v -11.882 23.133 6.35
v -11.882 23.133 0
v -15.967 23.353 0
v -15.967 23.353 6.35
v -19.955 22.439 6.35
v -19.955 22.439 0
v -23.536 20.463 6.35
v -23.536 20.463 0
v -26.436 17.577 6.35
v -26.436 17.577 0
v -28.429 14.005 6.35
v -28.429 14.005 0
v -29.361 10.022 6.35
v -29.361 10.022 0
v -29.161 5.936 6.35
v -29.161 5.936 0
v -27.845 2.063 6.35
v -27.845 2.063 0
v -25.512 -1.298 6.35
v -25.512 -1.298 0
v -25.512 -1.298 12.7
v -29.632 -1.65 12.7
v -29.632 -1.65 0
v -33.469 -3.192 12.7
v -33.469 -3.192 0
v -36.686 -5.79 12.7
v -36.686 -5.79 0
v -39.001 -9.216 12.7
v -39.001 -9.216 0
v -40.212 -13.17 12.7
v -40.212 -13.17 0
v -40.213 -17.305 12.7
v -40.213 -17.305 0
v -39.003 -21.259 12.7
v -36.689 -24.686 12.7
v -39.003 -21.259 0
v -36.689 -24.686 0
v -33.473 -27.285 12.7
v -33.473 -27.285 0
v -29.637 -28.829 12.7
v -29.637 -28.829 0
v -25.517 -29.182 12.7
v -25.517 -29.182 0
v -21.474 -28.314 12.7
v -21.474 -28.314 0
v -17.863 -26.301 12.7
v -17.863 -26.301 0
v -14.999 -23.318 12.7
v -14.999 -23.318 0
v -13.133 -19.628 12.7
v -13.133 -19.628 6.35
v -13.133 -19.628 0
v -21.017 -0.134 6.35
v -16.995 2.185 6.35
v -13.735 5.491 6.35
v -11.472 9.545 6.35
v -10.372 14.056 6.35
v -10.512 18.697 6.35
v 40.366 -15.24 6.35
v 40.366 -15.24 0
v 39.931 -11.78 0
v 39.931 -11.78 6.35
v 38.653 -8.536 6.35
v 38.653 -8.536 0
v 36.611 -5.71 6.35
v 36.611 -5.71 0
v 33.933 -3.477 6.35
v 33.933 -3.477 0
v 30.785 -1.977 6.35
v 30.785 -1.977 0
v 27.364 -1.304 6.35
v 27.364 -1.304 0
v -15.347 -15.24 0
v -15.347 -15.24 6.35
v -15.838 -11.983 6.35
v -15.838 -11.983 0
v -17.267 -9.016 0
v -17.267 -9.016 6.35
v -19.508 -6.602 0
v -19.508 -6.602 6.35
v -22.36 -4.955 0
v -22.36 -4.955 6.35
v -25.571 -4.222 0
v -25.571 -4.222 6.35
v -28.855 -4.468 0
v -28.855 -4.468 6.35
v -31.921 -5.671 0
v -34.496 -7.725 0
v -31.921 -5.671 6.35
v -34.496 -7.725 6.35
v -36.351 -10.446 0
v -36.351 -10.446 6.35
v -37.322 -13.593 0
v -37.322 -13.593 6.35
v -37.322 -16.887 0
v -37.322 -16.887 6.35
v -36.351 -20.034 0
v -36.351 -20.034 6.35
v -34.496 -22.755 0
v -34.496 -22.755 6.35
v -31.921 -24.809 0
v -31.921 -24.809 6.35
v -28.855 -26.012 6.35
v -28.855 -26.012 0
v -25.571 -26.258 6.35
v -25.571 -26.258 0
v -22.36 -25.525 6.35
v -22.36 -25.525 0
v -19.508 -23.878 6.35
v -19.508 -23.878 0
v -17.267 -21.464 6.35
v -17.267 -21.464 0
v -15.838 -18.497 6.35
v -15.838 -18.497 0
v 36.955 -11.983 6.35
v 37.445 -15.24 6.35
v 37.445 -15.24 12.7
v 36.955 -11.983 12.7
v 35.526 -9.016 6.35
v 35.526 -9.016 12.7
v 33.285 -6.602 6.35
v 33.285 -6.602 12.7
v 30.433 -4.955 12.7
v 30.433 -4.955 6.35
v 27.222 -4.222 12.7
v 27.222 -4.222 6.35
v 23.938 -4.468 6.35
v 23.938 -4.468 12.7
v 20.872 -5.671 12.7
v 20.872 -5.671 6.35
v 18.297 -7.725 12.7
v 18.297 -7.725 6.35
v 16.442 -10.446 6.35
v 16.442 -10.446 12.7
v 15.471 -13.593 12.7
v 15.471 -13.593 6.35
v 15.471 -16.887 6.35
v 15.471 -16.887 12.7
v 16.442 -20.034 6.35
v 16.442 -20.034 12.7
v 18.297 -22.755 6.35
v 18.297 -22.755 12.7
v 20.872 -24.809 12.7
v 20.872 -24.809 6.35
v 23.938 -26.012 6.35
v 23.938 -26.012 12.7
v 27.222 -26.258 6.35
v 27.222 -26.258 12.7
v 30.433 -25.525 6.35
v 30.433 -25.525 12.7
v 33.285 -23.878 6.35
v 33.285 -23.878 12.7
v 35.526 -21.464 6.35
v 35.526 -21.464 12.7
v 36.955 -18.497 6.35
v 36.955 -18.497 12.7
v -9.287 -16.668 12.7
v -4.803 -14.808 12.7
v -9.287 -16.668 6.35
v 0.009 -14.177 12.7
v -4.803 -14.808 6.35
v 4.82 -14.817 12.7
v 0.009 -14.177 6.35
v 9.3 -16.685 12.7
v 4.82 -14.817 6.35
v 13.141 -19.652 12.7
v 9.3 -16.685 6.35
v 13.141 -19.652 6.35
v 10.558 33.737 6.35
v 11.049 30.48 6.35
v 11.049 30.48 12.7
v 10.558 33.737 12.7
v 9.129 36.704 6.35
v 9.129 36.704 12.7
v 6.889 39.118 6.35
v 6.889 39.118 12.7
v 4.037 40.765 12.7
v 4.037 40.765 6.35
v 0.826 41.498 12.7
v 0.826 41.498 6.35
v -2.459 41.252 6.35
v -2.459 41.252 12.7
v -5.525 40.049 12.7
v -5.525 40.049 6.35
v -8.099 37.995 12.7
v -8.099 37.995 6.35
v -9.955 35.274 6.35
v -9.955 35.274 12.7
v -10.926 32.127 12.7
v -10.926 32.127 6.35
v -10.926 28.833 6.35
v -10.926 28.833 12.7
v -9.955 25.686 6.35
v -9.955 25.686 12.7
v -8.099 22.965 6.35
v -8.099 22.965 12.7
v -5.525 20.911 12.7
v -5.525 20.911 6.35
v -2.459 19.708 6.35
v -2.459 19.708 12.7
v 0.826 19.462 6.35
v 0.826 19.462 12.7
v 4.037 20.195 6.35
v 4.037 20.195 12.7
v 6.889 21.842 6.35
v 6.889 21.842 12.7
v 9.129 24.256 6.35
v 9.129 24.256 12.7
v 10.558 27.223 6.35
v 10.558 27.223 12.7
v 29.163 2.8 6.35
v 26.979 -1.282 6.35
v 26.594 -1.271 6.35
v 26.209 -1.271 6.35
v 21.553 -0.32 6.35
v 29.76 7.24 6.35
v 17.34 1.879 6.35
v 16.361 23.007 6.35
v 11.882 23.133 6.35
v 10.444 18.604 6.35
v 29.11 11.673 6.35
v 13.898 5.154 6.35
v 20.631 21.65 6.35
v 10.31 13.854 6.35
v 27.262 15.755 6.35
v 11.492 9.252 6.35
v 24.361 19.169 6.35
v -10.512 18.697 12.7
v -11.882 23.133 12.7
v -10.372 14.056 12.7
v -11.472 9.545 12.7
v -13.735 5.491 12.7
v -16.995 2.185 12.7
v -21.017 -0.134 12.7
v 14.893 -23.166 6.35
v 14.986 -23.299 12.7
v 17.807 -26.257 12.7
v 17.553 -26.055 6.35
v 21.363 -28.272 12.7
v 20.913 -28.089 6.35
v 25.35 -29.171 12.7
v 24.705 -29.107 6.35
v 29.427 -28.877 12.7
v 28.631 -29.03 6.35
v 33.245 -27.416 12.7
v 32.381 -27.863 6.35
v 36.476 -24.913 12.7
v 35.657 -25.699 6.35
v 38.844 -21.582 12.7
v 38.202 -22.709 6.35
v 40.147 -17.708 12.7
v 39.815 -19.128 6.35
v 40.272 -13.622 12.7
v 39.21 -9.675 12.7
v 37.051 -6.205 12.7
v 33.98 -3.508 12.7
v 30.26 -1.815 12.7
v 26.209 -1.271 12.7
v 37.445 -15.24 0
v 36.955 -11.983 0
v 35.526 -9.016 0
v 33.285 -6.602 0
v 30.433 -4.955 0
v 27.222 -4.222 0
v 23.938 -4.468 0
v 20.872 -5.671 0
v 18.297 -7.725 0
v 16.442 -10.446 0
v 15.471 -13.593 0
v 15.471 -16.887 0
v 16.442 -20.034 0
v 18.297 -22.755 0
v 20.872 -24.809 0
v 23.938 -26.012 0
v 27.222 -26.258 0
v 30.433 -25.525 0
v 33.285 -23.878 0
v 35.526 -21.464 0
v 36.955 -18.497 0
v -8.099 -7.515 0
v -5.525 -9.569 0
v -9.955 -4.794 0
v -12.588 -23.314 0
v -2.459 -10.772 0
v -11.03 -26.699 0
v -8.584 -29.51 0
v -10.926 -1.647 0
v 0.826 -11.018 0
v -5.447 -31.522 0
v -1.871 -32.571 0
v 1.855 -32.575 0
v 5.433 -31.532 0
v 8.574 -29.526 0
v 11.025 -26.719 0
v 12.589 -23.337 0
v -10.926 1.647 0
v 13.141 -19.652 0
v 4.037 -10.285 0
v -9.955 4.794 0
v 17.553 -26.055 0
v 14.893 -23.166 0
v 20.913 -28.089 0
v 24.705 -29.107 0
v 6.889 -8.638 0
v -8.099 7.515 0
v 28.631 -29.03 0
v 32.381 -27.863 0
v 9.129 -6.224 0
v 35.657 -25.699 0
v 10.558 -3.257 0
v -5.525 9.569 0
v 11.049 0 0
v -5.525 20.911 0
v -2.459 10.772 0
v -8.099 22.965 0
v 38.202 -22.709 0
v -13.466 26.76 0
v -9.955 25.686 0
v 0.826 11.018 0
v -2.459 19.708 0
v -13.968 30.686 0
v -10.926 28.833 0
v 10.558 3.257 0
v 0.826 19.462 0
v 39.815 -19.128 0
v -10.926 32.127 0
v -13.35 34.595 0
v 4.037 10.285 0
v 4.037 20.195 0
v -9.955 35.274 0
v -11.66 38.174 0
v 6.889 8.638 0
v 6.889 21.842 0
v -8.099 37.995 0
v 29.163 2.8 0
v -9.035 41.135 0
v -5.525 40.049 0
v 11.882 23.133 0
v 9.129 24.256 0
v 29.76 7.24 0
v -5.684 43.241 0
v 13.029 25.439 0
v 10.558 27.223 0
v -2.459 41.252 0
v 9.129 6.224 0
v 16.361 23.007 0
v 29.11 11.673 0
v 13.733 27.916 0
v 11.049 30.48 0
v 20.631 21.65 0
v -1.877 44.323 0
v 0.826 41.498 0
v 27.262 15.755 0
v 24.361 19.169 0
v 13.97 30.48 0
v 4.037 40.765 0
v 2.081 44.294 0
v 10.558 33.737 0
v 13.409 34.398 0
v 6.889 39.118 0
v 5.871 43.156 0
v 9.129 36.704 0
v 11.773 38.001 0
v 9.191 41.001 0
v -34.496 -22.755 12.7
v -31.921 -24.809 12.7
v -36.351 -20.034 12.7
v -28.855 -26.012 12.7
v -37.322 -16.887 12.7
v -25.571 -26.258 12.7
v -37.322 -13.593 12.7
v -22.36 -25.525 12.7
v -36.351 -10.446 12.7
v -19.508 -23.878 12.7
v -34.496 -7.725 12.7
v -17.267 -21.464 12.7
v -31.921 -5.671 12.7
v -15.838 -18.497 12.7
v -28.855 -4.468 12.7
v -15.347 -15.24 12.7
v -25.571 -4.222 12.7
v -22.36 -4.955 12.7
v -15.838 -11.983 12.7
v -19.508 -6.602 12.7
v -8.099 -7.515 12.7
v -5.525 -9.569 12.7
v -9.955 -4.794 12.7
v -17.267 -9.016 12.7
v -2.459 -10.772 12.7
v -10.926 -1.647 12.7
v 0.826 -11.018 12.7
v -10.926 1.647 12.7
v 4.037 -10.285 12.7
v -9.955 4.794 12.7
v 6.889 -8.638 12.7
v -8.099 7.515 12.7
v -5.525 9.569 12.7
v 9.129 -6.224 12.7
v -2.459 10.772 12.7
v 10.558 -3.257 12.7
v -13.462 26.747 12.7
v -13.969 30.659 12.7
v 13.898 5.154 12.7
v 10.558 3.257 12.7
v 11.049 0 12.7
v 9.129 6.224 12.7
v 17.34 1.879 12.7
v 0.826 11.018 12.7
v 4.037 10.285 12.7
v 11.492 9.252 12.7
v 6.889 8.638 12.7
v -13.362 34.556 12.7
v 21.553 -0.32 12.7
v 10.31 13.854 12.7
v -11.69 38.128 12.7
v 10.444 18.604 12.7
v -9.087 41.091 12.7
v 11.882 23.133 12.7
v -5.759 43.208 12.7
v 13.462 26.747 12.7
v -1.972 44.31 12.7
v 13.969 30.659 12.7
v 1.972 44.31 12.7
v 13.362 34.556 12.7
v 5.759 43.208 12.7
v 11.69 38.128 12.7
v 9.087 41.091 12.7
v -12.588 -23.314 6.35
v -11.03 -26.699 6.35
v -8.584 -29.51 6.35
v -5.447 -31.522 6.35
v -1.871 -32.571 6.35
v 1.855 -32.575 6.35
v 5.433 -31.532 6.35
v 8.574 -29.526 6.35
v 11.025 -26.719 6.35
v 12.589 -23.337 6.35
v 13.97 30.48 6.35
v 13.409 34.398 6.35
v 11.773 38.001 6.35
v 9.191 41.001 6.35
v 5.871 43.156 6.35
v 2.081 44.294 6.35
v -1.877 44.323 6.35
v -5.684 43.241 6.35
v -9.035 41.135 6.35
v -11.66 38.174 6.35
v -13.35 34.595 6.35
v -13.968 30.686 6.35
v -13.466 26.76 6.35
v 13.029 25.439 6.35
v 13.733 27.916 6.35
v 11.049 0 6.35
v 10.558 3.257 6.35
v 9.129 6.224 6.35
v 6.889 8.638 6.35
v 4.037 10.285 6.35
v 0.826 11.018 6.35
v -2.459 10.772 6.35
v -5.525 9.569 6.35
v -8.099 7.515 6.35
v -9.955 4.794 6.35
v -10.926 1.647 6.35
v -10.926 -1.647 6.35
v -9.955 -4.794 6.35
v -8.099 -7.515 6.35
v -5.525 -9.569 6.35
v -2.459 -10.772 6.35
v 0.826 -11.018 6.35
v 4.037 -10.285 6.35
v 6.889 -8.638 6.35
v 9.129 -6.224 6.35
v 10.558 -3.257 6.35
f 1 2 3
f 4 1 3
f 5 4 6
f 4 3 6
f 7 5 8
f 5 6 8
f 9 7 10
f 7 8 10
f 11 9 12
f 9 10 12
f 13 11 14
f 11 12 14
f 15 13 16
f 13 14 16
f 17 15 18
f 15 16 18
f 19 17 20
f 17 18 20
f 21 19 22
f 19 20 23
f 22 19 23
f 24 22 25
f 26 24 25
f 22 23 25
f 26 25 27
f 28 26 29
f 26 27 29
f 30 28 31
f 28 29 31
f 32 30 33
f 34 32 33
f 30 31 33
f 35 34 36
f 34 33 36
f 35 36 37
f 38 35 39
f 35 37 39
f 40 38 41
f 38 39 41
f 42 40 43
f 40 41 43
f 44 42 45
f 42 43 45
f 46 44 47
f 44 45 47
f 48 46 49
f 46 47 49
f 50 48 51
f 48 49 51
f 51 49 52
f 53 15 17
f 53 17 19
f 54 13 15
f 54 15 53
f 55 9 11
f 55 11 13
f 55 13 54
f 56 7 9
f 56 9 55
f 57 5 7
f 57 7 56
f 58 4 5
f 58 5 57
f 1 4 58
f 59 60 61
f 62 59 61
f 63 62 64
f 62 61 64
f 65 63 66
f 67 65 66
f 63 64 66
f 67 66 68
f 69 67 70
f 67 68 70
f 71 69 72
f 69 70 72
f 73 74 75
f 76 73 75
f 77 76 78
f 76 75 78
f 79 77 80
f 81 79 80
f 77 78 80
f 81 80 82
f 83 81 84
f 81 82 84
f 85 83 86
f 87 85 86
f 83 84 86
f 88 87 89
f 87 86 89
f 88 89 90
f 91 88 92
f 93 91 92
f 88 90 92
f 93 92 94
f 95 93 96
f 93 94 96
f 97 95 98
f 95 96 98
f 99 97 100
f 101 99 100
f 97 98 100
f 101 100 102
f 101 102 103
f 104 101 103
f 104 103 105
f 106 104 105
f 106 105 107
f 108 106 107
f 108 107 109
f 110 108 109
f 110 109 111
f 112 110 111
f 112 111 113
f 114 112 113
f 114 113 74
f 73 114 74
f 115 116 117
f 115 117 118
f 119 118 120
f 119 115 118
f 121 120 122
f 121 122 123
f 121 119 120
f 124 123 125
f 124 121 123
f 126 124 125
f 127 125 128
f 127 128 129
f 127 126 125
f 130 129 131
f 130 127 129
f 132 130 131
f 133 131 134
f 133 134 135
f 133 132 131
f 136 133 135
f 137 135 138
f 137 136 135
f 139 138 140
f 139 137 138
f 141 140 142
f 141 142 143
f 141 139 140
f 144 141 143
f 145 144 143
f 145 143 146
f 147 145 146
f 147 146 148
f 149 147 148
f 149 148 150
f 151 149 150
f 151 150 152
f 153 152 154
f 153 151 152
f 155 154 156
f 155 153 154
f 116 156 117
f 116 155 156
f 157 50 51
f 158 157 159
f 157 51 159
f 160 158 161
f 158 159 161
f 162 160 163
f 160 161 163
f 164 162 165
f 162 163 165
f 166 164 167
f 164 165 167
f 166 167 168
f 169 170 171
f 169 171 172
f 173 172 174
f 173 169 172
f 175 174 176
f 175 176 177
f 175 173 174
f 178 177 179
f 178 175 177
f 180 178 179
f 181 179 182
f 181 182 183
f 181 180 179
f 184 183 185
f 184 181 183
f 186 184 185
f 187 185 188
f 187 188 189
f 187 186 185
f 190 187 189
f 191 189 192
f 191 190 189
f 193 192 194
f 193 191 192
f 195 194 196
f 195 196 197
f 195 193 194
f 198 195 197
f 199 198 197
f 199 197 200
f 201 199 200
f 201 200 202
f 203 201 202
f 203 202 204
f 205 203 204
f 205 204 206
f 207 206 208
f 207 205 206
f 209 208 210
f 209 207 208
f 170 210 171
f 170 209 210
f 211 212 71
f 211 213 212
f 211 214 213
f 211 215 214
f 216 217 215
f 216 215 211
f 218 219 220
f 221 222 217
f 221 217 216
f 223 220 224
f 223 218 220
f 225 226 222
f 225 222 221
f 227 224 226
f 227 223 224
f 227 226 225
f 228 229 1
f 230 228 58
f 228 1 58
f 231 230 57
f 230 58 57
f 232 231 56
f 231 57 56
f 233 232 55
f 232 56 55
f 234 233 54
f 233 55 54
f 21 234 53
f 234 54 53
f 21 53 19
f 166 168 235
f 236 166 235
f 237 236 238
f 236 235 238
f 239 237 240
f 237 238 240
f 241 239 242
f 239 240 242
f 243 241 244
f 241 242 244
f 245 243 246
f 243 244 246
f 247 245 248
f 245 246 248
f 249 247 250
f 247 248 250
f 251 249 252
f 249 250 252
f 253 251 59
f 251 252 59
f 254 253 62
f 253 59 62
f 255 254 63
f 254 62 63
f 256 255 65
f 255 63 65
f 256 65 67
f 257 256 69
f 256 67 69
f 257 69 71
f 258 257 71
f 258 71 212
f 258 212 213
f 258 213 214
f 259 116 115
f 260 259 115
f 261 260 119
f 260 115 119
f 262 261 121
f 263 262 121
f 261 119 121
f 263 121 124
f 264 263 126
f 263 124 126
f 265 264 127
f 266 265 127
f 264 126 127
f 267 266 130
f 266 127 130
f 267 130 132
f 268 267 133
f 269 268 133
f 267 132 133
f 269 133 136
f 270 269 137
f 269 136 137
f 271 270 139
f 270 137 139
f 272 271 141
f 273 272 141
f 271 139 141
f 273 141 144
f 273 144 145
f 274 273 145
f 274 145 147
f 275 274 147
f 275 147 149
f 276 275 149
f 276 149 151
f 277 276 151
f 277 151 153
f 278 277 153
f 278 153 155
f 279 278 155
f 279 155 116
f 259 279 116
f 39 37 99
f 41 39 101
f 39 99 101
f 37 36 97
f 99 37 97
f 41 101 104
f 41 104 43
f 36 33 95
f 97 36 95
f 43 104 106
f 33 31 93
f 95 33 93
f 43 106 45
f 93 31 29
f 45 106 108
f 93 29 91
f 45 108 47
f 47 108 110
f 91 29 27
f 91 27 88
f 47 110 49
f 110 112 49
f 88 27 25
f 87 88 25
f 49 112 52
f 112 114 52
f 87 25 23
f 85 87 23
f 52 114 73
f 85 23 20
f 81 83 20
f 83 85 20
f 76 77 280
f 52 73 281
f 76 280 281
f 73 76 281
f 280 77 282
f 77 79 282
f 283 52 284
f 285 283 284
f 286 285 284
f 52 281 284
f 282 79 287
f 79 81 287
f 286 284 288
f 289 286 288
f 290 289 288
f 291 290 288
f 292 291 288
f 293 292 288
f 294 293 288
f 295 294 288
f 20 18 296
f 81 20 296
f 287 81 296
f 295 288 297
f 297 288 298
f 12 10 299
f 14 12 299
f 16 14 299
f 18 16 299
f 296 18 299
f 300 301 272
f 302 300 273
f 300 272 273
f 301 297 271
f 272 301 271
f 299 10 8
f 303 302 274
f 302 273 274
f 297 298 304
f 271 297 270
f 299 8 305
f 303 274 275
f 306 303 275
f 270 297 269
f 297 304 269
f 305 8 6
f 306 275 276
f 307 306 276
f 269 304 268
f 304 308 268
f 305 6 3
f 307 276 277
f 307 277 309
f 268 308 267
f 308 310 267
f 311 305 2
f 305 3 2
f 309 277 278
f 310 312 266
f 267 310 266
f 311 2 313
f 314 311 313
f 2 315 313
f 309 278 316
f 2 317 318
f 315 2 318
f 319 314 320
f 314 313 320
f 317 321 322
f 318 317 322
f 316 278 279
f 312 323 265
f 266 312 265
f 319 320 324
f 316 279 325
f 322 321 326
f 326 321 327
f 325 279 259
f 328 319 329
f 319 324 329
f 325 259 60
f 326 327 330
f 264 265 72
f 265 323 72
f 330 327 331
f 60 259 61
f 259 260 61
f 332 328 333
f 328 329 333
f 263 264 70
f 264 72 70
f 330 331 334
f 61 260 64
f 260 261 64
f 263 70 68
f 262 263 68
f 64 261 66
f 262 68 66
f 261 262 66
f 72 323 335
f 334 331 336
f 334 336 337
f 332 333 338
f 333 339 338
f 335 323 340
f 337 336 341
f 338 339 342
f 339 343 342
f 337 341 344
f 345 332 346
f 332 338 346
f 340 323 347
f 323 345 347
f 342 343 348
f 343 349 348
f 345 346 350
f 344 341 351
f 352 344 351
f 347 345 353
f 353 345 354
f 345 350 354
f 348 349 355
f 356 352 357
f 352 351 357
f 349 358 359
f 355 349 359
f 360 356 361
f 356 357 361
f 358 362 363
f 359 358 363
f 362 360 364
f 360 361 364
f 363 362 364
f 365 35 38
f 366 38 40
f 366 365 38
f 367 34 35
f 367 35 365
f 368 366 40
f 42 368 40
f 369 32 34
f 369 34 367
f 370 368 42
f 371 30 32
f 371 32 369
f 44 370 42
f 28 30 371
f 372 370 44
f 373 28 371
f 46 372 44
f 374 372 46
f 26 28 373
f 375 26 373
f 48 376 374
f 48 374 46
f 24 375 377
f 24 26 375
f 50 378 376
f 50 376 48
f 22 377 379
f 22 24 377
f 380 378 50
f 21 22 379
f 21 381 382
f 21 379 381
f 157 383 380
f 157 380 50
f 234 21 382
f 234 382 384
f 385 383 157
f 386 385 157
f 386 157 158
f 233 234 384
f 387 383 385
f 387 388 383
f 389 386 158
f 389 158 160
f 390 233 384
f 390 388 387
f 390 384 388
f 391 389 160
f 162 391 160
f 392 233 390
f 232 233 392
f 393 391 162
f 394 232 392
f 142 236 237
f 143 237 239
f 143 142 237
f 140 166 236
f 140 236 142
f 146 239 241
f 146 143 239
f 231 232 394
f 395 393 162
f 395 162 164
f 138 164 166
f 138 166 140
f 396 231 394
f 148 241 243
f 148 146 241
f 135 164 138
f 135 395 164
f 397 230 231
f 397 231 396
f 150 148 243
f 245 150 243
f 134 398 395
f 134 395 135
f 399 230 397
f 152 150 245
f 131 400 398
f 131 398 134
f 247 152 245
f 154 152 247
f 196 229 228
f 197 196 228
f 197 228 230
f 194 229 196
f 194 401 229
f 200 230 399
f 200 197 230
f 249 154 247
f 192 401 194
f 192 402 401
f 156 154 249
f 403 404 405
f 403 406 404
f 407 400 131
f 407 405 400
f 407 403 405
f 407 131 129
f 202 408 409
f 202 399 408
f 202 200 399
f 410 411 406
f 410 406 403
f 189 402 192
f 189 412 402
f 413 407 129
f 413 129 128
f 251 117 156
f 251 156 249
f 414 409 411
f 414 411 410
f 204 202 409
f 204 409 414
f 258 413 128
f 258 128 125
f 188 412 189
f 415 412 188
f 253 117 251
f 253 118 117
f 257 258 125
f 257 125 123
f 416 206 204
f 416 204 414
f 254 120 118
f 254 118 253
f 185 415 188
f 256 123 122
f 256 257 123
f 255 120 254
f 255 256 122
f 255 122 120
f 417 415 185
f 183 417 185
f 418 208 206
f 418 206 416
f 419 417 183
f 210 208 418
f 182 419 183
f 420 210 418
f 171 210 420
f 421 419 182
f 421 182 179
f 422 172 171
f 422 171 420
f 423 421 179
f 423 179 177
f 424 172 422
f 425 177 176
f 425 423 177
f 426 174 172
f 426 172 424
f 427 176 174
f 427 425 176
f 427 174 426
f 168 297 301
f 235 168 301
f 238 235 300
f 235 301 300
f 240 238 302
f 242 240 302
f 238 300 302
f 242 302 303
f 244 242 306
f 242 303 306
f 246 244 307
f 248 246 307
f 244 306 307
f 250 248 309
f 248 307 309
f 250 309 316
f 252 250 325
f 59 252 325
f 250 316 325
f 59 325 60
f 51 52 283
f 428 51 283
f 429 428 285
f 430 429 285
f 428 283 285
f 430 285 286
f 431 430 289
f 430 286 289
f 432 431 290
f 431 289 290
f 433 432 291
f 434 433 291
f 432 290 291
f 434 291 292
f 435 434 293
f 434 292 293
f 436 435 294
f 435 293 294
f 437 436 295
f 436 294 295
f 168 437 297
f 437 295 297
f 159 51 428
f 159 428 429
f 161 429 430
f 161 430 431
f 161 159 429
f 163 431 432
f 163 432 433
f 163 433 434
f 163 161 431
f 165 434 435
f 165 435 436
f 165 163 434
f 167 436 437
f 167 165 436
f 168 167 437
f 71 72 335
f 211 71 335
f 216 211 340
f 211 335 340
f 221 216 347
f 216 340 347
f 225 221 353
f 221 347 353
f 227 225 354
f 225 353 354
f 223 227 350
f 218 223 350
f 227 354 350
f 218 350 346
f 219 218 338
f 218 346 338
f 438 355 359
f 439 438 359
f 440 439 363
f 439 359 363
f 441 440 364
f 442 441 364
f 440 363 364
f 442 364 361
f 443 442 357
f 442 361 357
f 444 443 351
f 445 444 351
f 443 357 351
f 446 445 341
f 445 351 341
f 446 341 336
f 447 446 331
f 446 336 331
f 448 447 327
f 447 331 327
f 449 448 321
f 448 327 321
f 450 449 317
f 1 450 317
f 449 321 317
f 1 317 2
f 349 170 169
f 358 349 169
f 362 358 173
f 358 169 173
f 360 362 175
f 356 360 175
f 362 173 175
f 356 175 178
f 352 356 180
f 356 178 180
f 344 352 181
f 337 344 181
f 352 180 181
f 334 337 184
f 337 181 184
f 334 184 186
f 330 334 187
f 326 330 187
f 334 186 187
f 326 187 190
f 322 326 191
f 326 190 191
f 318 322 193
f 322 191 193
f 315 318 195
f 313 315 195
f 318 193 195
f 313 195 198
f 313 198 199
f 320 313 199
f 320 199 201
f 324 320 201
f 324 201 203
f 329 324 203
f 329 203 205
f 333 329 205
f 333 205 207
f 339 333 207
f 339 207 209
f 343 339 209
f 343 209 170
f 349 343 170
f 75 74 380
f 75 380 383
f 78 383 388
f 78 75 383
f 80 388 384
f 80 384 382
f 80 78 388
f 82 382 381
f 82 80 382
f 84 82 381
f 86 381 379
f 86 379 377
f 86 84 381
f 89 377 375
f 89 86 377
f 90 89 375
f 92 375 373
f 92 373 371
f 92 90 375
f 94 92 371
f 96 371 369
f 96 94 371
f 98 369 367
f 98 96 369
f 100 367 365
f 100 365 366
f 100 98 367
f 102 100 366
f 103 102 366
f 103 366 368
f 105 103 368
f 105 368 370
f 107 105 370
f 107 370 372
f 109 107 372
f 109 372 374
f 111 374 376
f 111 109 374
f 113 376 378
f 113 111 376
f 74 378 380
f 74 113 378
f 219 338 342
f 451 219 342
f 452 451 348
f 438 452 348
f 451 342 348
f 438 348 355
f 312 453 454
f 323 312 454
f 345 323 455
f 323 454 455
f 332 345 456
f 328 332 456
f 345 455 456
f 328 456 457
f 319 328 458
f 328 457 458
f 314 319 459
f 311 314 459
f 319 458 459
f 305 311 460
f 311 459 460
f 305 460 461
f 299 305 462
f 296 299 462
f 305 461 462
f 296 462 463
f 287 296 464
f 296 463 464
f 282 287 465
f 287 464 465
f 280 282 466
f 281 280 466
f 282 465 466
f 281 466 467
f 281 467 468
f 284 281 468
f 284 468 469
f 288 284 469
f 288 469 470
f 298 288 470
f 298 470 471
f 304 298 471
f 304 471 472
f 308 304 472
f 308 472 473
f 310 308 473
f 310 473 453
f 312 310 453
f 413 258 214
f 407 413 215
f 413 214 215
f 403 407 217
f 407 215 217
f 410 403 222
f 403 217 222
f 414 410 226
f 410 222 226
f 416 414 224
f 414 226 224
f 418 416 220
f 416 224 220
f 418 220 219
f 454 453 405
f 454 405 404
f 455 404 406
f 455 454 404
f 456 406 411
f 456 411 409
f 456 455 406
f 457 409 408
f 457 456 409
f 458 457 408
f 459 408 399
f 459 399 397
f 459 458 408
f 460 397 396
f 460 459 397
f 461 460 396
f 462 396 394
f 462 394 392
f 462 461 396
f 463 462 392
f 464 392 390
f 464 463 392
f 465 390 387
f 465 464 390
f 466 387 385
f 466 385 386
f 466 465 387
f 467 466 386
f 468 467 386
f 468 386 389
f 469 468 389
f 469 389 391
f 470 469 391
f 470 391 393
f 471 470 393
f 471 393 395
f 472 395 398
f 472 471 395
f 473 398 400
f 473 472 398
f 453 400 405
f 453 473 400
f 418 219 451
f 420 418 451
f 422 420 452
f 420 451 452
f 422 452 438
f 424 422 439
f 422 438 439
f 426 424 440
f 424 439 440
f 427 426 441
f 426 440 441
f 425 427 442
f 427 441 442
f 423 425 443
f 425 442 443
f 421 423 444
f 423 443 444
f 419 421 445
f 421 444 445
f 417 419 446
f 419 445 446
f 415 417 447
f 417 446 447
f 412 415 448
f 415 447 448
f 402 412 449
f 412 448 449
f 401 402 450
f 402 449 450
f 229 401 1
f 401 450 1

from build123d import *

# Parameters (mm, degrees)
F0_R       = 13.97
F0_R_2     = 11.049
F1_DEPTH   = 6.35
F2_R       = 11.049
F3_DEPTH   = 6.35
F4_DEPTH   = 6.35
F1_FACE_R  = 11.049
F1_FACE1_R = 11.049
F5_DEPTH   = 6.35
F6_DEPTH   = 25.4


with BuildPart() as f1:
    # F0 (on Top) → F1 (new body)
    with BuildSketch(Plane.XY):
        with BuildLine():
            ThreePointArc((11.8822308851, 23.133334825), (0, 16.51), (-11.8822308851, 23.133334825))
            ThreePointArc((-11.8822308851, 23.133334825), (-12.4666938835, 7.4417065656), (-25.5122345043, -1.2980110694))
            ThreePointArc((-25.5122345043, -1.2980110694), (-16.2103497858, -5.6794469472), (-12.4264543073, -15.24))
            ThreePointArc((-12.4264543073, -15.24), (-12.6043267068, -17.4621872669), (-13.1334144003, -19.627786734))
            ThreePointArc((-13.1334144003, -19.627786734), (0.0089857965, -14.1771556489), (13.141390917, -19.6518243979))
            ThreePointArc((13.141390917, -19.6518243979), (15.0105571103, -7.1454187867), (26.2086928391, -1.2712618454))
            ThreePointArc((26.2086928391, -1.2712618454), (12.551407877, 7.1187703581), (11.8822308851, 23.133334825))
        make_face()
        Circle(F0_R, mode=Mode.SUBTRACT)
        Circle(F0_R)
        Circle(F0_R_2, mode=Mode.SUBTRACT)
        with BuildLine():
            ThreePointArc((11.8822308851, 23.133334825), (13.4379251647, 26.6612217572), (13.97, 30.48))
            ThreePointArc((13.97, 30.48), (-3.8187782428, 43.9179251647), (-11.8822308851, 23.133334825))
            ThreePointArc((-11.8822308851, 23.133334825), (0, 16.51), (11.8822308851, 23.133334825))
        make_face()
        with Locations((0, 30.48)):
            Circle(F0_R_2, mode=Mode.SUBTRACT)
        with BuildLine():
            ThreePointArc((-12.4264543073, -15.24), (-16.2103497858, -5.6794469472), (-25.5122345043, -1.2980110694))
            ThreePointArc((-25.5122345043, -1.2980110694), (-37.9736477628, -23.0585351374), (-13.1334144003, -19.627786734))
            ThreePointArc((-13.1334144003, -19.627786734), (-12.6043267068, -17.4621872669), (-12.4264543073, -15.24))
        make_face()
        with Locations((-26.3964543073, -15.24)):
            Circle(F0_R_2, mode=Mode.SUBTRACT)
        with BuildLine():
            ThreePointArc((27.3639044924, -1.3035391817), (26.786025252, -1.2971860413), (26.2086928391, -1.2712618454))
            ThreePointArc((26.2086928391, -1.2712618454), (15.0105571103, -7.1454187867), (13.141390917, -19.6518243979))
            ThreePointArc((13.141390917, -19.6518243979), (28.6311427014, -29.0301076059), (40.3664543073, -15.24))
            ThreePointArc((40.3664543073, -15.24), (36.6110560883, -5.7098997667), (27.3639044924, -1.3035391817))
        make_face()
        with Locations((26.3964543073, -15.24)):
            Circle(F0_R_2, mode=Mode.SUBTRACT)
        with Locations((26.3964543073, -15.24)):
            Circle(F0_R_2)
        Circle(F0_R_2)
        with Locations((0, 30.48)):
            Circle(F0_R_2)
        with Locations((-26.3964543073, -15.24)):
            Circle(F0_R_2)
        with BuildLine():
            ThreePointArc((27.3639044924, -1.3035391817), (26.7866325748, -1.275449849), (26.2086928391, -1.2712618454))
            ThreePointArc((26.2086928391, -1.2712618454), (26.786025252, -1.2971860413), (27.3639044924, -1.3035391817))
        make_face()
    extrude(amount=F1_DEPTH)

    # F2 (on face) → F3 (cut)
    with BuildSketch(Plane.XY.offset(6.35)):
        with Locations((-26.3964543073, -15.24)):
            Circle(F2_R)
        with Locations((0, 30.48)):
            Circle(F2_R)
        with Locations((26.3964543073, -15.24)):
            Circle(F2_R)
    extrude(amount=-F3_DEPTH, mode=Mode.SUBTRACT)

    # F2 (on face) → F4 (cut)
    with BuildSketch(Plane.XY.offset(6.35)):
        Circle(F2_R)
    extrude(amount=-F4_DEPTH, mode=Mode.SUBTRACT)

    # F0 (on Top) + F1_face (on face) + F1_face1 (on face) → F5 (join)
    with BuildSketch(Plane.XY):
        with BuildLine():
            ThreePointArc((11.8822308851, 23.133334825), (0, 16.51), (-11.8822308851, 23.133334825))
            ThreePointArc((-11.8822308851, 23.133334825), (-12.4666938835, 7.4417065656), (-25.5122345043, -1.2980110694))
            ThreePointArc((-25.5122345043, -1.2980110694), (-16.2103497858, -5.6794469472), (-12.4264543073, -15.24))
            ThreePointArc((-12.4264543073, -15.24), (-12.6043267068, -17.4621872669), (-13.1334144003, -19.627786734))
            ThreePointArc((-13.1334144003, -19.627786734), (0.0089857965, -14.1771556489), (13.141390917, -19.6518243979))
            ThreePointArc((13.141390917, -19.6518243979), (15.0105571103, -7.1454187867), (26.2086928391, -1.2712618454))
            ThreePointArc((26.2086928391, -1.2712618454), (12.551407877, 7.1187703581), (11.8822308851, 23.133334825))
        make_face()
        Circle(F0_R, mode=Mode.SUBTRACT)
        with BuildLine():
            ThreePointArc((11.8822308851, 23.133334825), (13.4379251647, 26.6612217572), (13.97, 30.48))
            ThreePointArc((13.97, 30.48), (-3.8187782428, 43.9179251647), (-11.8822308851, 23.133334825))
            ThreePointArc((-11.8822308851, 23.133334825), (0, 16.51), (11.8822308851, 23.133334825))
        make_face()
        with Locations((0, 30.48)):
            Circle(F0_R_2, mode=Mode.SUBTRACT)
        Circle(F0_R)
        Circle(F0_R_2, mode=Mode.SUBTRACT)
        with BuildLine():
            ThreePointArc((-12.4264543073, -15.24), (-16.2103497858, -5.6794469472), (-25.5122345043, -1.2980110694))
            ThreePointArc((-25.5122345043, -1.2980110694), (-37.9736477628, -23.0585351374), (-13.1334144003, -19.627786734))
            ThreePointArc((-13.1334144003, -19.627786734), (-12.6043267068, -17.4621872669), (-12.4264543073, -15.24))
        make_face()
        with Locations((-26.3964543073, -15.24)):
            Circle(F0_R_2, mode=Mode.SUBTRACT)
        with BuildLine():
            ThreePointArc((27.3639044924, -1.3035391817), (26.786025252, -1.2971860413), (26.2086928391, -1.2712618454))
            ThreePointArc((26.2086928391, -1.2712618454), (15.0105571103, -7.1454187867), (13.141390917, -19.6518243979))
            ThreePointArc((13.141390917, -19.6518243979), (28.6311427014, -29.0301076059), (40.3664543073, -15.24))
            ThreePointArc((40.3664543073, -15.24), (36.6110560883, -5.7098997667), (27.3639044924, -1.3035391817))
        make_face()
        with Locations((26.3964543073, -15.24)):
            Circle(F0_R_2, mode=Mode.SUBTRACT)
        with Locations((26.3964543073, -15.24)):
            Circle(F0_R_2)
        with Locations((0, 30.48)):
            Circle(F0_R_2)
        with Locations((-26.3964543073, -15.24)):
            Circle(F0_R_2)
        Circle(F0_R_2)
        with BuildLine():
            ThreePointArc((13.141390917, -19.6518243979), (0.0089857965, -14.1771556489), (-13.1334144003, -19.627786734))
            ThreePointArc((-13.1334144003, -19.627786734), (-0.0079653205, -32.7058821649), (13.141390917, -19.6518243979))
        make_face()
        with BuildLine():
            ThreePointArc((27.3639044924, -1.3035391817), (27.2624668136, 15.7547428761), (11.8822308851, 23.133334825))
            ThreePointArc((11.8822308851, 23.133334825), (12.551407877, 7.1187703581), (26.2086928391, -1.2712618454))
            ThreePointArc((26.2086928391, -1.2712618454), (26.7866325748, -1.275449849), (27.3639044924, -1.3035391817))
        make_face()
        with BuildLine():
            ThreePointArc((-25.5122345043, -1.2980110694), (-12.4666938835, 7.4417065656), (-11.8822308851, 23.133334825))
            ThreePointArc((-11.8822308851, 23.133334825), (-27.5570644864, 15.8604734571), (-25.5122345043, -1.2980110694))
        make_face()
        with BuildLine():
            ThreePointArc((27.3639044924, -1.3035391817), (26.7866325748, -1.275449849), (26.2086928391, -1.2712618454))
            ThreePointArc((26.2086928391, -1.2712618454), (26.786025252, -1.2971860413), (27.3639044924, -1.3035391817))
        make_face()
    with BuildSketch(Plane(origin=(-0.004664817, 0.0791445283, 6.35), x_dir=(1, 0, 0), z_dir=(0, 0, 1))):
        with BuildLine():
            ThreePointArc((13.146055734, -19.7309689261), (37.7870163213, -23.4137257416), (26.213357656, -1.3504063737))
            ThreePointArc((26.213357656, -1.3504063737), (12.556072694, 7.0396258298), (11.886895702, 23.0541902967))
            ThreePointArc((11.886895702, 23.0541902967), (0.004664817, 44.3708554717), (-11.8775660681, 23.0541902967))
            ThreePointArc((-11.8775660681, 23.0541902967), (-12.4620290666, 7.3625620373), (-25.5075696873, -1.3771555977))
            ThreePointArc((-25.5075696873, -1.3771555977), (-37.9689829458, -23.1376796657), (-13.1287495833, -19.7069312623))
            ThreePointArc((-13.1287495833, -19.7069312623), (0.0136506135, -14.2563001772), (13.146055734, -19.7309689261))
        make_face()
        with Locations((-26.3917894904, -15.3191445283)):
            Circle(F1_FACE_R, mode=Mode.SUBTRACT)
        with Locations((26.4011191243, -15.3191445283)):
            Circle(F1_FACE_R, mode=Mode.SUBTRACT)
        with Locations((0.004664817, -0.0791445283)):
            Circle(F1_FACE_R, mode=Mode.SUBTRACT)
        with Locations((0.004664817, 30.4008554717)):
            Circle(F1_FACE_R, mode=Mode.SUBTRACT)
    with BuildSketch(Plane(origin=(-0.0103051715, 0.1748402862, 0), x_dir=(1, 0, 0), z_dir=(0, 0, -1))):
        with BuildLine():
            ThreePointArc((26.2189980105, 1.4461021316), (37.7926566758, 23.5094214995), (13.1516960884, 19.8266646841))
            ThreePointArc((13.1516960884, 19.8266646841), (0.019290968, 14.3519959351), (-13.1231092288, 19.8026270202))
            ThreePointArc((-13.1231092288, 19.8026270202), (-37.9633425914, 23.2333754236), (-25.5019293328, 1.4728513557))
            ThreePointArc((-25.5019293328, 1.4728513557), (-12.4563887121, -7.2668662794), (-11.8719257136, -22.9584945388))
            ThreePointArc((-11.8719257136, -22.9584945388), (0.0103051715, -44.2751597138), (11.8925360565, -22.9584945388))
            ThreePointArc((11.8925360565, -22.9584945388), (12.5617130485, -6.9439300719), (26.2189980105, 1.4461021316))
        make_face()
        with Locations((-26.3861491359, 15.4148402862)):
            Circle(F1_FACE1_R, mode=Mode.SUBTRACT)
        with Locations((26.4067594788, 15.4148402862)):
            Circle(F1_FACE1_R, mode=Mode.SUBTRACT)
        with Locations((0.0103051715, 0.1748402862)):
            Circle(F1_FACE1_R, mode=Mode.SUBTRACT)
        with Locations((0.0103051715, -30.3051597138)):
            Circle(F1_FACE1_R, mode=Mode.SUBTRACT)
    extrude(amount=F5_DEPTH, dir=(0, 0, 1))

    # F2 (on face) → F6 (cut)
    with BuildSketch(Plane.XY.offset(6.35)):
        with Locations((-26.3964543073, -15.24)):
            Circle(F2_R)
        Circle(F2_R)
        with Locations((0, 30.48)):
            Circle(F2_R)
        with Locations((26.3964543073, -15.24)):
            Circle(F2_R)
    extrude(amount=-F6_DEPTH, mode=Mode.SUBTRACT)


solid = f1.part
